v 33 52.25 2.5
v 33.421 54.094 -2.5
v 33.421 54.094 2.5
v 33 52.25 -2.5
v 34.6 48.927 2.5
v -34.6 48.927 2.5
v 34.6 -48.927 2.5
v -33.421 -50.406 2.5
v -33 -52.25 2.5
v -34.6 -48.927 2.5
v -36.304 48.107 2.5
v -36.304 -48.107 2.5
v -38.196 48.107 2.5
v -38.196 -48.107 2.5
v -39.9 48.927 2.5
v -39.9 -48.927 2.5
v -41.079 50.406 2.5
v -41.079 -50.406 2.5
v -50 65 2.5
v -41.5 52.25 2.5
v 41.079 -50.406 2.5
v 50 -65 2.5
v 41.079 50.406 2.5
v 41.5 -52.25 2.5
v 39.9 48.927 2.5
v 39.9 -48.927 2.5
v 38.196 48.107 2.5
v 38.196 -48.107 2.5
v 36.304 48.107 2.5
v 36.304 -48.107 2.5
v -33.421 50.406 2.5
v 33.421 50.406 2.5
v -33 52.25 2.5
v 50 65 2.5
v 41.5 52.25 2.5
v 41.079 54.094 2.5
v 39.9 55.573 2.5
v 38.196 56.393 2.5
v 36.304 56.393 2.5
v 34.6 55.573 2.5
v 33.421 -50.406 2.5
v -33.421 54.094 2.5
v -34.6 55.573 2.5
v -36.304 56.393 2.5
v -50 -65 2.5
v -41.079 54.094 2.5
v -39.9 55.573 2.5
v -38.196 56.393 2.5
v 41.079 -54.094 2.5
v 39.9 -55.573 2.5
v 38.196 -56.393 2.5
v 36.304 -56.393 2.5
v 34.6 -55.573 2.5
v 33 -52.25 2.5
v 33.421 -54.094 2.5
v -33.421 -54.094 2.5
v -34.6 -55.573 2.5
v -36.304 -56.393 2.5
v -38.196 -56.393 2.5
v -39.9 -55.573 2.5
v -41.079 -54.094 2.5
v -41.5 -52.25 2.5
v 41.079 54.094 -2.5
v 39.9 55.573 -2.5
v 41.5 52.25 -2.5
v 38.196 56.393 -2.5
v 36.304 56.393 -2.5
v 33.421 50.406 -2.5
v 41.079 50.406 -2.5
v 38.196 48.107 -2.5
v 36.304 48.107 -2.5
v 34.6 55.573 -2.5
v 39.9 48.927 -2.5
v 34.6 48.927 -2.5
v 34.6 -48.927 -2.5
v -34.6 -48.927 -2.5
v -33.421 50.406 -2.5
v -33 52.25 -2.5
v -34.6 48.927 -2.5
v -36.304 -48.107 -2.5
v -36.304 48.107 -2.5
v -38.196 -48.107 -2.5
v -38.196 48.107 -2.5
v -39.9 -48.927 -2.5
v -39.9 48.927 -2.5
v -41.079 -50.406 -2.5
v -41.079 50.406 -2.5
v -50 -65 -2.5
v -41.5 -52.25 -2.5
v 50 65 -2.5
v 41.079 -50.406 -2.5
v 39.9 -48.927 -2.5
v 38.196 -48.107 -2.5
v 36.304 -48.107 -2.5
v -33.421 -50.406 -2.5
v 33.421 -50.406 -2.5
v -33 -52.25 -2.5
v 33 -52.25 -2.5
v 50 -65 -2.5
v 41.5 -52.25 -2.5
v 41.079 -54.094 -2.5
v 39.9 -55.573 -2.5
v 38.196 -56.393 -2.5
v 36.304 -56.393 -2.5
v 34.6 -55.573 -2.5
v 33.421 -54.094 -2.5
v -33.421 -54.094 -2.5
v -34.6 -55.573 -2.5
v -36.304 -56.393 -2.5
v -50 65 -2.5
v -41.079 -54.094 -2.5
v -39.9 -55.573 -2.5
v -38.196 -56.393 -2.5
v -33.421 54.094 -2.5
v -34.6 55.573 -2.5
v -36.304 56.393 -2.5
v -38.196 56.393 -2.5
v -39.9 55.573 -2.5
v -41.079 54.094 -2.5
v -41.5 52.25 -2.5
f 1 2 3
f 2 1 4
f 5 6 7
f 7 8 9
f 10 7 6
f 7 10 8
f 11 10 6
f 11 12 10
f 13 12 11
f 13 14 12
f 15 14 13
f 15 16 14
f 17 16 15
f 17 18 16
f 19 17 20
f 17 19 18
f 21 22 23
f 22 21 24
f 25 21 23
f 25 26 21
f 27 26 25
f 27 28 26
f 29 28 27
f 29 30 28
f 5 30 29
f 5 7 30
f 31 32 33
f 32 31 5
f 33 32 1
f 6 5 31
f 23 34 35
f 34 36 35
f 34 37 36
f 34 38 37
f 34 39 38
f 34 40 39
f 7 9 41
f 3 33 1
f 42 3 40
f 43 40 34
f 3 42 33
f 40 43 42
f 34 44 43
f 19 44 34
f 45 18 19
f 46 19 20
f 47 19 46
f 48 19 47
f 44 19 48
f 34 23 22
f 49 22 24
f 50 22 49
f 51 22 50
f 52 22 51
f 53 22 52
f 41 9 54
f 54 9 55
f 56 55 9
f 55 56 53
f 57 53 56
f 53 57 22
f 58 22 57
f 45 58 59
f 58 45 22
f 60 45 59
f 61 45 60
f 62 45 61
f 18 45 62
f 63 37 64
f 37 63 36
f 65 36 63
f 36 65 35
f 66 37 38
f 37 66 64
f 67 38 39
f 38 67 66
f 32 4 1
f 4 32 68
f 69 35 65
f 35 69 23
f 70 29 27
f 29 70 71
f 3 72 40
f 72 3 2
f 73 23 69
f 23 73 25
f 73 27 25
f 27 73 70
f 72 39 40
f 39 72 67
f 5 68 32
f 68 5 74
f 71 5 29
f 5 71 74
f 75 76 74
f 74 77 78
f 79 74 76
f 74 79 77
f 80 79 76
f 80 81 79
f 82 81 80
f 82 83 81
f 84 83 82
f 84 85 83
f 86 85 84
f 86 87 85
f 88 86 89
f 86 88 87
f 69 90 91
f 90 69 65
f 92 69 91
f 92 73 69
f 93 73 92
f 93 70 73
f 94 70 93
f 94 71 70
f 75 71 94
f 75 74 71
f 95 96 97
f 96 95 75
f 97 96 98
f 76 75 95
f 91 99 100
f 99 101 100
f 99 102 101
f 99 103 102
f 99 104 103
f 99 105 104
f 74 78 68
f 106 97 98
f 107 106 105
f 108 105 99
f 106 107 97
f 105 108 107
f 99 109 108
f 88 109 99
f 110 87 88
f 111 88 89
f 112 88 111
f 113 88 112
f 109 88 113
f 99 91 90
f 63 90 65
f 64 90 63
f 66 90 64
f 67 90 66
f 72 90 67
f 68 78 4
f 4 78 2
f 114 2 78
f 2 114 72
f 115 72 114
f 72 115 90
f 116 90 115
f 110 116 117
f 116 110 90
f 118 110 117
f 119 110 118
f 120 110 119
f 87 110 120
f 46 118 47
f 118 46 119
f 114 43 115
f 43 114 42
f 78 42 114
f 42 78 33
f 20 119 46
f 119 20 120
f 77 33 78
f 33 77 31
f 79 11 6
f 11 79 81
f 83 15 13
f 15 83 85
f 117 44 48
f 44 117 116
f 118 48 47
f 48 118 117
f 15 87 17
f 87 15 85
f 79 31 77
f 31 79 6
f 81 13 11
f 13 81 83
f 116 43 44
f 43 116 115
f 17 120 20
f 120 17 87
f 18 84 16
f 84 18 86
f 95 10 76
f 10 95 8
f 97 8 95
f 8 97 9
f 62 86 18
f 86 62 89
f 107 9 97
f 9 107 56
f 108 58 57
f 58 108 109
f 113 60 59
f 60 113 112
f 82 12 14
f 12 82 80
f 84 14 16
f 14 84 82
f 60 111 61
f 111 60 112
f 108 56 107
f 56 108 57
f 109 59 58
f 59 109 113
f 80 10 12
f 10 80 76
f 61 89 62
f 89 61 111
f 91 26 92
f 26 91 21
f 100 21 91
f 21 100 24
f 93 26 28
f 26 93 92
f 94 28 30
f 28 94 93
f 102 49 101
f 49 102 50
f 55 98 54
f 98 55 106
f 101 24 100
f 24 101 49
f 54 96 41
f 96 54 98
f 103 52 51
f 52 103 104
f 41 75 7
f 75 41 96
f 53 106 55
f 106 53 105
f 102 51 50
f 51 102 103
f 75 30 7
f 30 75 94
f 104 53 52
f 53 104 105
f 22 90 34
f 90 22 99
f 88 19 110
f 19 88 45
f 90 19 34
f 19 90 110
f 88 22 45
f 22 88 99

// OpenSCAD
// Generated by SolidPython 1.1.3 on 2023-02-19 21:06:39


difference() {
	cube(center = true, size = [100, 130.0000000000, 5]);
	union() {
		translate(v = [37.2500000000, 52.2500000000]) {
			cylinder(center = true, h = 5, r = 4.2500000000);
		}
		translate(v = [-37.2500000000, 52.2500000000]) {
			cylinder(center = true, h = 5, r = 4.2500000000);
		}
		translate(v = [-37.2500000000, -52.2500000000]) {
			cylinder(center = true, h = 5, r = 4.2500000000);
		}
		translate(v = [37.2500000000, -52.2500000000]) {
			cylinder(center = true, h = 5, r = 4.2500000000);
		}
	}
}
/***********************************************
*********      SolidPython code:      **********
************************************************
 
import solid
import numbers
import pudb
from solid.utils import *
import viewscad
import subprocess
import os
import os.path as osp
import math
import sys

chamfer_extrude=solid.import_scad("./chamfer_extrude.scad")
chamfer_extrude=chamfer_extrude.chamfer_extrude
r = viewscad.Renderer(width=800, height=800)

def debug(model,f_name,path="/home/ts/code/projects/mfd/designs/debug"):
    solid.scad_render_to_file(model,osp.join(path,f_name)+".scad")
#generate position list of wells using offset from center
wells_pos_from_center_4 = lambda offset: [[-offset,offset],
                                        [offset, offset],
                                        [-offset, -offset],
                                        [offset, -offset]]
#wells_pos_from_center_2 = lambda offset: [[0,offset],
#                                        [0, -offset]]
wells_pos_from_center_2 = lambda offset: [[offset,0],
                                        [-offset,0]]

def make_well(dims,shape=None,height=None,dxf=False):
    def circle_cylinder():
        if dxf or (height is None):
            well = solid.circle(r=dims, segments=64)
        else:
            well = solid.cylinder(r=dims, h=height, segments=64, center = True)
        return well
    if dims is None:
        sys.exit("radius needs to be a number")
    if isinstance(dims, numbers.Number):
        well =circle_cylinder()
    elif len(dims)==1:
        if isinstance(dims[1], numbers.Number):
            well =circle_cylinder()
        else:
            sys.exit("radius needs to be a number")
    elif len(dims)==2:
        well = solid.square(dims,center = True)
    elif len(dims)==3:
        well = solid.cube(dims, center = True)
    return well

def wells_top_bottom(center_gap,device_dims=None,shape=None,height=None, positions = None, dxf = False):
    well_shape = make_well(device_dims,shape=shape,height=height,dxf=dxf)
    wells = []
    if positions is None:
        offset = radius+radius/2.0
        positions = wells_pos_from_center_2(offset)
    if dxf or (height is None):
        height = 0
    for position in positions:
        if dxf:
            wells.append(solid.translate([position[0],position[1]])(well_shape))
        else:
            wells.append(solid.translate([position[0],position[1],height/2.0])(well_shape))
    return  union()(*wells)

#place wells in four corners 
def four_corner(radius,height=None, positions = None, dxf = False):
    #if well pos not specified set
    #to equally spaced by half radius
    if positions is None:
        offset = radius+radius/2.0
        positions = wells_pos_from_center_4(offset)
    if dxf or (height is None):
        height = 0
    #make wells at positions with specified radius and height
    wells = []
    for position in positions:
        #make circle if making dxf
        if dxf:
            well_shape = solid.circle(r=radius, segments=64)
            well_shape = solid.translate([position[0],position[1]])(well_shape)
        #if stl make cylinder
        else:
            well_shape = solid.cylinder(r=radius, h=height, segments=64, center = True)
            well_shape = solid.translate([position[0],position[1],height/2.0])(well_shape)
        wells.append(well_shape)
    return  union()(*wells)

#generate channels 
def make_channels(length,width,height=0,num_chans=1,max_chans=None,spacing=None, dxf = False,
                  rotate_channels=False):
    if dxf or (height is None):
        height = 0
    #if channel gap not defined, is equal to
    if spacing is None: spacing = width
    #calculate number of channels if fitting max num within given width
    if not max_chans is None:
        import math
        num_chans = math.floor((max_chans-spacing)/(width+spacing))
    #get total width of channel section  
    total_width = (width*num_chans)+(spacing*(num_chans-1))

    #make template channel
    #if rotate_channels: width, length = length, width
    if dxf:
        channel_t = solid.square([length,width],center = True)
    else:
        channel_t = solid.cube([length,width,height], center = True)

    #if number channels is even, offset the first channel to center its gap
    if num_chans % 2 == 0: centering = -(width/2.0+spacing/2.0)
    else: centering = 0
    #move template channel up to align bottom at z = 0 
    #and offset center if necessary
    if dxf:
        channel_t = solid.translate([0,centering])(channel_t)
    else:
        channel_t = solid.translate([0,centering,height/2.0])(channel_t)

    #if rotate_channels: length,width = width,length
    #start making the channels
    channels = []
    for i in range(num_chans):
        #if i=0 there is no translation
        #if i=1, we make the first channel adjacent to second
        direction = i

        #if i>=1, we add channels alternating left and right
        if i >= 1:
            direction = -(i/2.0)
            if i % 2 == 1: direction = (-direction)+0.5
                
        #make channel at right position and add it to channel list
        translation_coords = [0,direction*(width+spacing)]
        #if rotate_channels: translation_coords = [direction*(width+spacing),0]
        if dxf:
            channel = solid.translate(translation_coords)(channel_t)
        else:
            channel = solid.translate([*translation_coords,0])(channel_t)
        channels.append(channel)
    
    #group all channels as one object
    channels = union()(*channels)
    #compute the x,y,z dimensions in order to pass as arguments 
    #for construction of other parts of device (such as the chambers)
    measurements = {'x':(length/2.0,-length/2.0),
                    'y':(total_width/2.0,-total_width/2.0)}
    if not dxf:
        measurements['z'] = (height,0)
    if rotate_channels:
        channels = solid.rotate(90)(channels)
        measurements['x'],measurements['y']=measurements['y'],measurements['x']
    return channels,measurements

def make_chambers(msrs,height=None,extra=0,len_until=None,width=None, dxf = False):
    #computes x,y,z length
    total = lambda x : abs(x[0]) + abs(x[1])
    
    #if specific height if specified
    #otherwise use same height as channels
    if dxf:
        pass
    elif not height is None:
        msrs['z'] = (height,0)
    else:
        msrs['z'] = (0,0)
        
    #make copy of measurements from channels to modify chamber dimensions 
    #and add length to chambers as specified
    chamber_dims = msrs.copy()
    #calculate length of chamber to reach specified offset
    if not len_until is None:
        chamber_len = len_until-(msrs['x'][0])
    #or add specified length to channel length (if not specified, adds 0)
    else:
        chamber_len = msrs['x'][0]+extra
    #set the chamber length based 
    chamber_dims['x'] = (chamber_len/2.0,-(chamber_len/2.0))
    #compute final dimensions of chamber
    if not width is None:
        chamber_dims['y'] = (width/2.0,-width/2.0)
    chamber_dims = [total(size) for size in chamber_dims.values()]
        
    #calculate chamber translation offset to place adjacent to channels
    chamber_trslt = msrs['x'][0]+(chamber_len/2.0)
    #compute chamber translation coordinates to align with channels
    #x = 1 moves chamber above channels
    #x = -1 moves chamber below channels
    if dxf:
        trslt = lambda x : [x*(chamber_trslt),0]
    else:
        trslt = lambda x : [x*(chamber_trslt),0,msrs['z'][0]/2.0]
    
    #function to make chamber at top or at bottom 
    if dxf:
        move = lambda x : solid.translate(trslt(x))(solid.square(chamber_dims, center = True) )
    else:
        move = lambda x : solid.translate(trslt(x))(solid.cube(chamber_dims,center = True))
    #make top and bottom chambers and return them as grouped
    top = move(1)
    bottom = move(-1)
    #chambers=solid.rotate(90)(solid.union()(top,bottom))
    chambers=(solid.union()(top,bottom))

    return chambers

#create alignment features 
def alignment_features(unit,dims,grid_size, mask_size = None, alignment = "hollow", units_from_center = (2.5,2.5), corner_len=None):
    width = grid_size[0]*dims[0]
    length = grid_size[1]*dims[1]
    if mask_size is None and corner_len is None:
        corner_len = (dims[0] + dims[1]) /2 / 8
    corner = lambda thickness_div : solid.union()( solid.square([corner_len,corner_len/thickness_div],center=False), solid.square([corner_len/thickness_div,corner_len],center=False) )
    
    def make_full(thickness_div):
        thickness = corner_len/thickness_div
        tr = solid.translate([0, 0, 0 ])(solid.rotate(180)(corner(thickness_div)))
        tr = solid.translate([thickness/2,thickness/2,0])(tr)
        bl = solid.translate([0, 0, 0 ])(solid.rotate(0)(corner(thickness_div)))
        bl = solid.translate([-thickness/2,-thickness/2,0])(bl)
        return solid.union()(tr,bl)
    
    def make_hollow(thickness_div):
        thickness = corner_len/(thickness_div/2)
        inner = make_full(thickness_div)
        outer = make_full(thickness_div/2)
        hollow = outer - inner 
        return hollow
    
    center = (width /2 , length/2)
    mask_pos = lambda x,y : (center[0] + x*(float(units_from_center[0])*dims[0]), center[1] + y*(float(units_from_center[1])*dims[1]))
    positions = []
    positions.append(mask_pos(1,0))
    positions.append(mask_pos(0,1))
    positions.append(mask_pos(-1,0))
    positions.append(mask_pos(0,-1))
    make_mask = lambda mtype : make_hollow(8) if mtype == "hollow" else make_full(8)
    masks = [ solid.translate([*position,0])(make_mask(alignment)) for position in positions]
    
    solid.scad_render_to_file(solid.union()(*masks),"./designs/open_chamber/masks.scad")
    #return unit - solid.union()(*masks)
    return solid.union()(*masks,unit)

def create_outline(thickness, array, dims, grid_size,):
    width = grid_size[0]*dims[0] + thickness *2
    length = grid_size[1]*dims[1] + thickness *2
    outer = solid.translate([-thickness, -thickness,0])(solid.square([width, length]))
    return outer-array

def create_wall(wall_thickness, outline_thickness, dims, grid_size, wall_height = 2000, dxf = False):
    inner_width = grid_size[0]*dims[0] + outline_thickness *2
    inner_length = grid_size[1]*dims[1] + outline_thickness *2
    outer_width = inner_width + wall_thickness * 2
    outer_length = inner_length + wall_thickness * 2
    outer_pos_x = -outline_thickness-wall_thickness
    outer_pos_y = -outline_thickness-wall_thickness
    inner_pos_x = -outline_thickness
    inner_pos_y = -outline_thickness
    if dxf:
        inner_wall = solid.translate([inner_pos_x,
                                      inner_pos_y,
                                      0])(solid.square([inner_width, inner_length]))
        outer_wall = solid.translate([outer_pos_x,
                                      outer_pos_y,
                                      0])(solid.square([outer_width, outer_length]))

        return outer_wall-inner_wall
    else:
        inner_wall = solid.translate([inner_pos_x,
                                      inner_pos_y,
                                      0])(solid.cube([inner_width, inner_length,wall_height]))
        outer_wall = solid.translate([outer_pos_x,
                                      outer_pos_y,
                                      0])(solid.cube([outer_width, outer_length,wall_height]))

        return outer_wall-inner_wall, {'wall_height': wall_height,
                                       'wall_thickness': wall_thickness,
                                       'inner_width':inner_width,
                                       'inner_length': inner_length,
                                       'outer_width': outer_width,
                                       'outer_length': outer_length,
                                       'outer_pos_x' : outer_pos_x,
                                       'outer_pos_y' : outer_pos_y,
                                       'inner_pos_x' : inner_pos_x,
                                       'inner_pos_y' : inner_pos_y}

def create_thicker_wall(wall_thickness, outer_wall_offset, wall_dims, dims, grid_size, height_start = .2, height_end=2, dxf = False):
    addon_wall,thicker_wall_dims = create_wall(wall_thickness, outer_wall_offset, dims, grid_size, wall_height=height_end-height_start, dxf = False)
    addon_wall = solid.translate([0,0,height_start])(addon_wall)

    thicker_wall_dims['wall_height'] = height_end
    thicker_wall_dims['wall_thickness'] = wall_dims['wall_thickness'] + wall_thickness
    return addon_wall, thicker_wall_dims
 
def add_lock_to_wall(wall,wall_dims,y_offset = 0,cut_ratio=0.7,L_length=3, gap_ratio=0.05, axis="x",width_ratio=1/2):
    # Makes L shape
    def make_L(max_length,length_thickness,max_width,width_thickness,height,y_offset):
        length = solid.cube([max_length,length_thickness,height])
        width = solid.cube([width_thickness,max_width,height])
        width = solid.translate([max_length-(width_thickness),0,0])(width)
        L = solid.union()(width,length)
        debug(L,"L")
        if axis == "x":
            L = solid.rotate(-90)(L)
            L = solid.translate([0,max_length,0])(L)
        else:
            L = solid.rotate(-180)(L)
            L = solid.translate([max_length,max_width,0])(L)
        return solid.translate([0,0,y_offset])(L)
    
    lock_length = L_length
    lock_width = wall_dims['wall_thickness']*width_ratio
    lock_length_thickness = lock_width/2
    lock_width_thickness = lock_width/2
    L_lock = make_L(lock_length,lock_length_thickness,lock_width,lock_width_thickness, wall_dims['wall_height']-y_offset, y_offset)
    
    margin_space = lock_length - lock_length*(1-gap_ratio)
    key_length = lock_length-margin_space
    key_length_thickness = lock_length_thickness-(margin_space*2)
    key_width = lock_width-(margin_space*2)
    key_width_thickness = lock_width_thickness-(margin_space*2)
    L_key = make_L(key_length,key_length_thickness,key_width,key_width_thickness, wall_dims['wall_height']-y_offset, y_offset)
    L_key = solid.translate([margin_space,margin_space,0])(L_key)
    L = solid.union()(L_lock,L_key)
    debug(L,"L")
    
    #Make cube to be used as negative to split frame in a half
    #Can choose if making left or right negative, specify ratio of split
    def make_negative(right,cut_ratio):
        if axis == "x":
            if right:
                length = wall_dims['outer_length']*(1-cut_ratio)
                pos_x = wall_dims['outer_pos_x']+(wall_dims['outer_length']*cut_ratio)
            else:
                length = wall_dims['outer_length']*(cut_ratio)
                pos_x = wall_dims['outer_pos_x'] 
            negative = solid.cube([wall_dims['outer_width'],length, wall_dims['wall_height']])
            negative = solid.translate([wall_dims['outer_pos_y'],pos_x,0])(negative)
        else:
            if right:
                length = wall_dims['outer_width']*(1-cut_ratio)
                pos_x = wall_dims['outer_pos_y']+(wall_dims['outer_width']*cut_ratio)
            else:
                length = wall_dims['outer_width']*(cut_ratio)
                pos_x = wall_dims['outer_pos_y'] 
            negative = solid.cube([length,wall_dims['outer_length'], wall_dims['wall_height']])
            negative = solid.translate([pos_x,wall_dims['outer_pos_x'],0])(negative)
        return negative, pos_x, length 
                      
    #Make negatives
    negative_right, right_half_pos_x, right_half_length = make_negative(True,cut_ratio)
    negative_left, left_half_pos_x, right_half_length = make_negative(False,cut_ratio)
    #Make halves
    left_half = solid.difference()(wall,negative_right)
    right_half = solid.difference()(wall,negative_left)
    def place_L(L, L_length,L_width):
        #Place L on top wall       
        offset_to_center = (wall_dims['wall_thickness']-L_width)/2
        if axis == "x":
            y_pos_top = (wall_dims['outer_pos_y'] +
                    wall_dims['outer_width'] - 
                    L_width - offset_to_center)
            top_L = solid.translate([y_pos_top,
                                     right_half_pos_x-(L_length),
                                     0])(L)
            #Place L on bottom wall       
            y_pos_bottom = wall_dims['outer_pos_y']+offset_to_center
            bottom_L = solid.translate([y_pos_bottom,
                                        right_half_pos_x-L_length,
                                        0])(L)
        else:
            y_pos_top = (wall_dims['outer_pos_x'] +
                    wall_dims['outer_length'] -
                    (L_width+offset_to_center))
            top_L = solid.translate([right_half_pos_x-L_length,
                                     y_pos_top,
                                     0])(L)
            #Place L on bottom wall       
            y_pos_bottom = wall_dims['outer_pos_y']+offset_to_center
            bottom_L = solid.translate([right_half_pos_x-L_length,
                                        y_pos_bottom,
                                        0])(L)
        return bottom_L, top_L
    #Make complimentary L pieces through union and differences
    #Make Lock
    bottom_L_lock, top_L_lock = place_L(L_lock,L_length,lock_width)
    left_half = solid.difference()(left_half,bottom_L_lock)
    left_half = solid.difference()(left_half,top_L_lock)
    #Make Key
    bottom_L_key, top_L_key = place_L(L_key,L_length,lock_width)
    right_half = solid.union()(right_half,bottom_L_key)
    right_half = solid.union()(right_half,top_L_key)
    return left_half, right_half


#build a row x col grid of containment units
def make_unit_array(unit,dims,grid_size, dxf = False, alignment = None, mask_size = None,
                    units_from_center = None,alignment_offset=None, alignment_mark_size=1):
    units = []
    for col in range(grid_size[1]):
        for row in range(grid_size[0]):
            if dxf:
                units.append(solid.translate([row*dims[0],col*dims[1]])(unit))
            else:
                units.append(solid.translate([row*dims[0],col*dims[1],dims[2]/2.0])(unit))
    array = solid.union()(*units)
    if (not alignment is None) and dxf:
        if not alignment_offset is None:
            array = solid.translate([alignment_offset[0],alignment_offset[1]])(array)
        array = alignment_features(array,dims, grid_size, alignment = alignment, mask_size = None, units_from_center = units_from_center,corner_len=alignment_mark_size)
        if not alignment_offset is None:
            array = solid.translate([-alignment_offset[0],-alignment_offset[1]])(array)
    return array


def make_taylor(wells_pos = wells_pos_from_center_4(2.25), well_rad = 1.5 ,
                well_height = 2, chan_w = 0.01, chan_l = 1, chan_h = 0.010 ,
                chan_gap = 0.040, max_chans = None,num_chans=100, chamber_height  = 0.100,
                columns = 1, rows = 1, chamber_len_until=2.25, add_channels = True, add_wells = True, 
                add_chambers = True, save_path = "./", alignment = None, units_from_center = 2,
                mask_size = None, render_stl = False, outline_thickness = 0.050, dxf = True,
                wall_height = 15, wall_thickness = 0.95, casing_x=9, casing_y=9, casing_z=0,rotate_units=0):

    dims = [casing_x, casing_y, casing_z]
    wells = four_corner(well_rad,well_height, dxf = dxf, positions = wells_pos)
    debug(wells,"wells")
    channels, msrs = make_channels(chan_l,chan_w,chan_h,dxf=dxf, spacing = chan_gap, max_chans=max_chans,num_chans=num_chans)
    debug(channels,"channels")
    chambers = make_chambers(msrs,dxf = dxf, height=chamber_height,len_until=chamber_len_until)
    debug(chambers,"chambers")

    #add together and render
    device_parts = []
    if add_channels:
        device_parts.append(channels)
    if add_wells:
        device_parts.append(wells)
    if add_chambers:
        device_parts.append(chambers)
    device=union()(*device_parts)
    device = rotate(rotate_units)(device)

    device=solid.translate([dims[0]/2.0,dims[1]/2.0,0])(device)
    channels = rotate(rotate_units)(channels)
    channels=solid.translate([dims[0]/2,dims[1]/2,0])(channels)
    chambers_wells = union()(wells,chambers)
    chambers_wells = rotate(rotate_units)(chambers_wells)
    chambers_wells=solid.translate([dims[0]/2,dims[1]/2,0])(chambers_wells)

    file_name = str(rows)+'x'+str(columns)+'_units_'
    grid_size = [rows,columns]

    if alignment:
        alignment="full"
    device = make_unit_array(device,dims,grid_size, dxf=dxf, alignment = alignment,
                                 units_from_center = units_from_center)
    channels = make_unit_array(channels,dims,grid_size, dxf=dxf, alignment = alignment,
                                 units_from_center = units_from_center)
    if alignment=="full":
        alignment="hollow"

    chambers_wells = make_unit_array(chambers_wells,dims,grid_size, dxf=dxf, alignment = alignment,
                                 units_from_center =units_from_center)

    def save_model(model,prefix):
        model_fname = os.path.abspath(save_path+prefix+"_"+file_name+".scad")
        solid.scad_render_to_file(model,model_fname)
        return model_fname

    wells_fname = save_model(wells,"wells")
    channels_fname = save_model(channels,"channels")
    device_fname = save_model(device,"device")
    chambers_wells_fname = save_model(chambers_wells,"chambers_wells")
    return (chambers_wells,chambers_wells_fname), (channels,channels_fname), (device,device_fname)

def make_device(design='open',rows=8,columns=6,wells_pos = 4.5,well_offset=3.2, well_rad=3.2,well_height=0.1,
                chan_l=1,chan_w=0.01,chan_h=0.01,chan_gap=0.015,num_chans=101,dxf=True,save_path="./designs/open_chamber/",
                casing_x=9.0,casing_y=18.0,casing_z=0,rotate_units=90,units_from_center=(3,1),chamber_len_until=4.5,
                chamber_width=None,alignment=True, add_wells=True, add_channels=True,add_chambers=True):

    dims = [casing_x, casing_y, casing_z]
    if design == "open":
        wells_pos=wells_pos_from_center_2(wells_pos)
        wells = wells_top_bottom(well_offset*2,device_dims=well_rad,height=well_height, dxf = dxf, positions = wells_pos)
    elif design == "closed":
        wells_pos=wells_pos_from_center_4(wells_pos)
        debug(wells,"wells")
        wells = four_corner(well_offset,well_heightdevice_dims=well_rad, dxf = dxf, positions = wells_pos)
    else:
        print(design+" is not a valid design.\n Choose valid design: 'open' or 'closed'")
        exit()
    wells = rotate(rotate_units)(wells)
    wells=solid.translate([dims[0]/2,dims[1]/2,0])(wells)
    debug(wells,"wells")

    channels, msrs = make_channels(chan_l,chan_w,chan_h,dxf=dxf, spacing = chan_gap, num_chans=num_chans,rotate_channels=False)
    channels = rotate(rotate_units)(channels)
    channels=solid.translate([dims[0]/2,dims[1]/2,0])(channels)

    chambers=make_chambers(msrs,height=None,extra=0,len_until=chamber_len_until, width=chamber_width,dxf = dxf)
    chambers = rotate(rotate_units)(chambers)
    chambers=solid.translate([dims[0]/2,dims[1]/2,0])(chambers)

    device_parts = []
    if add_channels:
        device_parts.append(channels)
    if add_wells:
        device_parts.append(wells)
    if add_chambers:
        device_parts.append(chambers)
    device = union()(*device_parts)
    #device = rotate(rotate_units)(device)
    #device=solid.translate([dims[0]/2.0,dims[1]/2.0,0])(device)

    chambers_wells = []
    if add_chambers:
        chambers_wells.append(chambers)
    if add_wells:
        chambers_wells.append(wells)
    chambers_wells = union()(*chambers_wells)
    #chambers_wells = union()(wells,chambers)
    #chambers_wells = rotate(rotate_units)(chambers_wells)
    #chambers_wells=solid.translate([dims[0]/2,dims[1]/2,0])(chambers_wells)

    file_name = str(rows)+'x'+str(columns)+'_units_'

    grid_size = [rows,columns]
    if alignment:
        alignment="full"
    device = make_unit_array(device,dims,grid_size, dxf=dxf, alignment = alignment,
                                 units_from_center = units_from_center)
    channels = make_unit_array(channels,dims,grid_size, dxf=dxf, alignment = alignment,
                                 units_from_center = units_from_center)
    if alignment=="full":
        alignment="hollow"

    chambers_wells = make_unit_array(chambers_wells,dims,grid_size, dxf=dxf, alignment = alignment,
                                 units_from_center =units_from_center)

    def save_model(model,prefix):
        model_fname = os.path.abspath(save_path+prefix+"_"+file_name+".scad")
        solid.scad_render_to_file(model,model_fname)
        return model_fname

    wells_fname = save_model(wells,"wells")
    channels_fname = save_model(channels,"channels")
    device_fname = save_model(device,"device")
    chambers_wells_fname = save_model(chambers_wells,"chambers_wells")
    return (chambers_wells,chambers_wells_fname), (channels,channels_fname), (device,device_fname)


def make_open_chamber(rows=8,columns=6,wells_pos = wells_pos_from_center_2(4.5), well_rad=3.2,well_height=0.1,
                      chan_l=1,chan_w=0.01,chan_h=0.01,chan_gap=0.015,num_chans=101,dxf=True,save_path="./designs/open_chamber/",
                      casing_x=9.0,casing_y=18.0,casing_z=0,rotate_units=90,units_from_center=(3,1),chamber_len_until=4.5,
                      chamber_width=None,alignment=True, add_wells=True, add_channels=True,add_chambers=True):

    dims = [casing_x, casing_y, casing_z]
    wells = wells_top_bottom(well_rad,height=well_height, dxf = dxf, positions = wells_pos)
    channels, msrs = make_channels(chan_l,chan_w,chan_h,dxf=dxf, spacing = chan_gap, num_chans=num_chans,rotate_channels=False)
    chambers=make_chambers(msrs,height=None,extra=0,len_until=chamber_len_until, width=chamber_width,dxf = dxf)
    debug(chambers,"chambers")
    device_parts = []
    if add_channels:
        device_parts.append(channels)
    if add_wells:
        device_parts.append(wells)
    if add_chambers:
        device_parts.append(chambers)
    device = union()(*device_parts)
    device = rotate(rotate_units)(device)
    device=solid.translate([dims[0]/2.0,dims[1]/2.0,0])(device)
    channels = rotate(rotate_units)(channels)
    channels=solid.translate([dims[0]/2,dims[1]/2,0])(channels)
    chambers_wells = union()(wells,chambers)
    chambers_wells = rotate(rotate_units)(chambers_wells)
    chambers_wells=solid.translate([dims[0]/2,dims[1]/2,0])(chambers_wells)

    file_name = str(rows)+'x'+str(columns)+'_units_'

    grid_size = [rows,columns]
    if alignment:
        alignment="full"
    device = make_unit_array(device,dims,grid_size, dxf=dxf, alignment = alignment,
                                 units_from_center = units_from_center)
    channels = make_unit_array(channels,dims,grid_size, dxf=dxf, alignment = alignment,
                                 units_from_center = units_from_center)
    if alignment=="full":
        alignment="hollow"

    chambers_wells = make_unit_array(chambers_wells,dims,grid_size, dxf=dxf, alignment = alignment,
                                 units_from_center =units_from_center)

    def save_model(model,prefix):
        model_fname = os.path.abspath(save_path+prefix+"_"+file_name+".scad")
        solid.scad_render_to_file(model,model_fname)
        return model_fname

    wells_fname = save_model(wells,"wells")
    channels_fname = save_model(channels,"channels")
    device_fname = save_model(device,"device")
    chambers_wells_fname = save_model(chambers_wells,"chambers_wells")
    return (chambers_wells,chambers_wells_fname), (channels,channels_fname), (device,device_fname)

def to_dxf(scad_path):
    dxf_path = scad_path.replace(".scad",".dxf")
    subprocess.call(["openscad", "-o", dxf_path, scad_path])
    import ezdxf
    temp_dxf = ezdxf.readfile(dxf_path)
    temp_dxf.saveas(dxf_path)

#def make_walls(diameter,thickness,grid_size,dims,height=20,segments=256,make_inner=True):
#    wafer_wall_out = solid.cylinder(r=diameter/2,h=height, segments=segments)
#    wafer_wall_in = solid.cylinder(r=(diameter/2-thickness),h=height, segments=segments)
#    wafer_wall = solid.difference()(wafer_wall_out,wafer_wall_in)
#    wafer_wall = solid.translate([grid_size[1]*dims[1]/2.0,grid_size[0]*dims[0]/2.0])(wafer_wall)
#
#    vertical_wall_length = grid_size[1]*dims[1]
#    horizontal_wall_length = grid_size[0]*dims[0]
#    vertical_wall = solid.cube([vertical_wall_length,thickness,height],center = True)
#    vertical_wall = solid.translate([vertical_wall_length/2,0,height/2])(vertical_wall)
#    horizontal_wall = solid.cube([thickness,horizontal_wall_length,height],center = True)
#    horizontal_wall = solid.translate([0,vertical_wall_length/2,height/2])(horizontal_wall)
#    walls = []
#    walls.append(horizontal_wall)
#    walls.append(vertical_wall)
#    for col in range(grid_size[1]):
#        if col == grid_size[1]-1: 
#            walls.append(solid.translate([0,(col+1)*dims[1]])(vertical_wall))
#        elif col > 0 and col < grid_size[1]-1 and make_inner==True:
#            walls.append(solid.translate([0,(col+1)*dims[1]])(vertical_wall))
#    for row in range(grid_size[0]):
#        if row == grid_size[0]-1: 
#            walls.append(solid.translate([(row+1)*dims[0],0])(horizontal_wall))
#        elif row > 0 and row < grid_size[0]-1 and make_inner==True:
#            walls.append(solid.translate([(row+1)*dims[0],0])(horizontal_wall))
#    walls = union()(*walls)
#    wafer_walls = union()(walls,wafer_wall)
#    return walls,wafer_wall,wafer_walls

def make_walls(diameter,thickness,grid_size,dims,height=20,segments=256,make_inner=True,padx=0,pady=0):
    wafer_wall_out = solid.cylinder(r=diameter/2,h=height, segments=segments)
    wafer_wall_in = solid.cylinder(r=(diameter/2-thickness),h=height, segments=segments)
    wafer_wall = solid.difference()(wafer_wall_out,wafer_wall_in)
    wafer_wall = solid.translate([grid_size[1]*dims[1]/2.0,grid_size[0]*dims[0]/2.0])(wafer_wall)

    vertical_wall_length = grid_size[0]*dims[0]+padx
    horizontal_wall_length = grid_size[1]*dims[1]+pady
    vertical_wall = solid.cube([vertical_wall_length,thickness,height],center = True)
    vertical_wall = solid.translate([vertical_wall_length/2-pady/2,-padx/2,height/2])(vertical_wall)
    horizontal_wall = solid.cube([thickness,horizontal_wall_length,height],center = True)
    horizontal_wall = solid.translate([-pady/2,horizontal_wall_length/2-padx/2,height/2])(horizontal_wall)
    walls = []
    walls.append(horizontal_wall)
    walls.append(vertical_wall)
    for col in range(grid_size[1]):
        if col == grid_size[1]-1: 
            walls.append(solid.translate([0,(col+1)*dims[1]+pady])(vertical_wall))
        elif col > 0 and col < grid_size[1]-1 and make_inner==True:
            walls.append(solid.translate([0,(col+1)*dims[1]])(vertical_wall))
    for row in range(grid_size[0]):
        if row == grid_size[0]-1: 
            walls.append(solid.translate([(row+1)*dims[0]+padx,0])(horizontal_wall))
        elif row > 0 and row < grid_size[0]-1 and make_inner==True:
            walls.append(solid.translate([(row+1)*dims[0],0])(horizontal_wall))
    walls = union()(*walls)
    wafer_walls = union()(walls,wafer_wall)
    return walls,wafer_wall,wafer_walls

def save_model(model,base_path,base_name,dxf=True):
    if not os.path.exists(base_path):
        os.makedirs(base_path)
    dxf_path=osp.join(base_path,base_name+".scad")
    solid.scad_render_to_file(model,osp.join(dxf_path))
    if dxf:
        to_dxf(dxf_path)

def make_wafer(diameter,flat_len,thickness):
    wafer = solid.cylinder(r1=diameter/2,r2=diameter/2,h=thickness,segments=512,)()
    x_start_flat=(flat_len/2)
    y_start_flat = math.sqrt(((diameter/2)**2) - (x_start_flat**2) )
    height_delete_flat=diameter/2-y_start_flat
    flat_delete = solid.cube([flat_len,height_delete_flat,thickness],center=False)()
    flat_delete = solid.translate([-flat_len/2,y_start_flat,0])(flat_delete)
    wafer = solid.difference()(wafer,flat_delete)
    wafer = solid.rotate(90)(wafer)
    return wafer

def add_wafer_to_mask(wafer_size,flat_len,mask,grid_size,dims,wafer_line_thickness=0.1,outer_mask_thickness=5,alignment_offset=None):
    def make_wafer_mask(wafer_size,flat_len):
        wafer_mask = make_wafer(wafer_size,flat_len,1)
        wafer_mask = solid.projection()(wafer_mask)
        wafer_mask = solid.translate([grid_size[0]*dims[0]/2.0,grid_size[1]*dims[1]/2.0])(wafer_mask)
        if not alignment_offset is None:
            wafer_mask = solid.translate([-alignment_offset[0],-alignment_offset[1]])(wafer_mask)
        return wafer_mask

    inner_wafer_line_mask = make_wafer_mask(wafer_size-wafer_line_thickness/2,flat_len)
    outer_wafer_line_mask = make_wafer_mask(wafer_size+wafer_line_thickness/2,flat_len)
    outer_wafer_mask = make_wafer_mask(wafer_size+outer_mask_thickness,flat_len)
    outer_wafer_mask = solid.difference()(outer_wafer_mask,outer_wafer_line_mask)
    wafer_mask = solid.union()(outer_wafer_mask,inner_wafer_line_mask)

    return solid.difference()(wafer_mask,mask)

def make_posts(post_shape,post_height):
    posts = solid.linear_extrude(height=post_height)(post_shape)
    return posts

def make_wafer_empty(diameter,flat_len,thickness,margin,notch_len=20,notch_height=5,oversize=1.01):
    diameter*=oversize
    flat_len*=oversize
    wafer = make_wafer(diameter,flat_len,thickness)
    holder = solid.cylinder(r1=diameter/2+margin,r2=diameter/2+margin,h=thickness,segments=512)()
    holder = solid.difference()(holder,wafer)

    x_start_flat=(flat_len/2)
    y_start_flat = math.sqrt(((diameter/2)**2) - (x_start_flat**2) )
    height_delete_flat=diameter/2-y_start_flat
    notch = solid.cube([notch_len,notch_height,thickness],center=False)()
    notch = solid.translate([-notch_len/2,y_start_flat,0])(notch)
    notch = solid.rotate(90)(notch)
    return solid.difference()(holder,notch)

def wafer_print_calibration(diameter,thickness,height,z_offset):
    circles = []
    radii = []
    radii.append(diameter/2.0*0.8)
    radii.append(diameter/2.0*0.6)
    radii.append(diameter/2.0*0.4)
    radii.append(diameter/2.0*0.2)
    for radius in radii:
        inner = solid.cylinder(r1=radius-(thickness/2.0),r2=radius-(thickness/2.0),h=thickness,segments=512,)()
        outer = solid.cylinder(r1=radius+(thickness/2.0),r2=radius+(thickness/2.0),h=thickness,segments=512,)()
        diff = solid.difference()(outer,inner)
        circles.append(diff)
    circles = solid.union()(*circles)
    circles = solid.translate([0,0,z_offset])(circles)
    return circles

def make_rack(wells,dims,grid_size,alignment_offset,rack_x,rack_y,rack_thickness,bolt_width,add_bolts=True):

    #get X and Y dimensions of gride of pipette tips
    X_len = dims[0]*grid_size[0]
    Y_len = dims[1]*grid_size[1]
    #make rack
    rack = solid.cube([rack_x,rack_y,rack_thickness],center=True)

    if add_bolts:
    #add bolt holes
        bolt_hole=solid.cylinder(r=bolt_width/2,h=rack_thickness,center=True)()
        bolt_holes = []
        bolt_holes.append(solid.translate([rack_x/2-1.5*bolt_width,rack_y/2-1.5*bolt_width])(bolt_hole))
        bolt_holes.append(solid.translate([-rack_x/2+1.5*bolt_width,rack_y/2-1.5*bolt_width])(bolt_hole))
        bolt_holes.append(solid.translate([-rack_x/2+1.5*bolt_width,-rack_y/2+1.5*bolt_width])(bolt_hole))
        bolt_holes.append(solid.translate([rack_x/2-1.5*bolt_width,-rack_y/2+1.5*bolt_width])(bolt_hole))
        bolt_holes = solid.union()(*bolt_holes)
        rack=solid.difference()(rack,bolt_holes)
    rack_support = rack

    #center rack with pipette holes
    rack = solid.translate([0,0,rack_thickness/2])(rack)
    rack = solid.translate([X_len/2,Y_len/2])(rack)
    rack = solid.translate([-alignment_offset[0],-alignment_offset[1]])(rack)
    wells = solid.linear_extrude(height=rack_thickness)(wells)
    rack = solid.difference()(rack,wells)
    return rack, rack_support

def make_pillar(wells,dims,grid_size,alignment_offset,rack_x,rack_y,pillar_height,rack_thickness,bolt_width,add_bolts=True,taper_angle=1,bolt_position_corner=1.5):

    #get X and Y dimensions of gride of pipette tips
    X_len = dims[0]*grid_size[0]
    Y_len = dims[1]*grid_size[1]
    #make rack
    rack = solid.cube([rack_x,rack_y,rack_thickness],center=True)
    
    if add_bolts:
    #add bolt holes
        bolt_hole=solid.cylinder(r=bolt_width/2,h=rack_thickness,center=True)()
        bolt_holes = []
        bolt_holes.append(solid.translate([rack_x/2-bolt_position_corner*bolt_width,rack_y/2-bolt_position_corner*bolt_width])(bolt_hole))
        bolt_holes.append(solid.translate([-rack_x/2+bolt_position_corner*bolt_width,rack_y/2-bolt_position_corner*bolt_width])(bolt_hole))
        bolt_holes.append(solid.translate([-rack_x/2+bolt_position_corner*bolt_width,-rack_y/2+bolt_position_corner*bolt_width])(bolt_hole))
        bolt_holes.append(solid.translate([rack_x/2-bolt_position_corner*bolt_width,-rack_y/2+bolt_position_corner*bolt_width])(bolt_hole))
        bolt_holes = solid.union()(*bolt_holes)
        rack=solid.difference()(rack,bolt_holes)
    rack_support = rack

    #center rack with pipette holes
    #rack = solid.translate([0,0,-rack_thickness])(rack)
    rack = solid.translate([X_len/2,Y_len/2])(rack)
    rack = solid.translate([-alignment_offset[0],-alignment_offset[1]])(rack)
    if not taper_angle == 0:
        wells=chamfer_extrude(pillar_height,taper_angle,segments=20)(wells)
    else:
        wells = solid.linear_extrude(height=pillar_height)(wells)
    rack = solid.union()(rack,wells)
    return rack, rack_support









 
 
************************************************/
